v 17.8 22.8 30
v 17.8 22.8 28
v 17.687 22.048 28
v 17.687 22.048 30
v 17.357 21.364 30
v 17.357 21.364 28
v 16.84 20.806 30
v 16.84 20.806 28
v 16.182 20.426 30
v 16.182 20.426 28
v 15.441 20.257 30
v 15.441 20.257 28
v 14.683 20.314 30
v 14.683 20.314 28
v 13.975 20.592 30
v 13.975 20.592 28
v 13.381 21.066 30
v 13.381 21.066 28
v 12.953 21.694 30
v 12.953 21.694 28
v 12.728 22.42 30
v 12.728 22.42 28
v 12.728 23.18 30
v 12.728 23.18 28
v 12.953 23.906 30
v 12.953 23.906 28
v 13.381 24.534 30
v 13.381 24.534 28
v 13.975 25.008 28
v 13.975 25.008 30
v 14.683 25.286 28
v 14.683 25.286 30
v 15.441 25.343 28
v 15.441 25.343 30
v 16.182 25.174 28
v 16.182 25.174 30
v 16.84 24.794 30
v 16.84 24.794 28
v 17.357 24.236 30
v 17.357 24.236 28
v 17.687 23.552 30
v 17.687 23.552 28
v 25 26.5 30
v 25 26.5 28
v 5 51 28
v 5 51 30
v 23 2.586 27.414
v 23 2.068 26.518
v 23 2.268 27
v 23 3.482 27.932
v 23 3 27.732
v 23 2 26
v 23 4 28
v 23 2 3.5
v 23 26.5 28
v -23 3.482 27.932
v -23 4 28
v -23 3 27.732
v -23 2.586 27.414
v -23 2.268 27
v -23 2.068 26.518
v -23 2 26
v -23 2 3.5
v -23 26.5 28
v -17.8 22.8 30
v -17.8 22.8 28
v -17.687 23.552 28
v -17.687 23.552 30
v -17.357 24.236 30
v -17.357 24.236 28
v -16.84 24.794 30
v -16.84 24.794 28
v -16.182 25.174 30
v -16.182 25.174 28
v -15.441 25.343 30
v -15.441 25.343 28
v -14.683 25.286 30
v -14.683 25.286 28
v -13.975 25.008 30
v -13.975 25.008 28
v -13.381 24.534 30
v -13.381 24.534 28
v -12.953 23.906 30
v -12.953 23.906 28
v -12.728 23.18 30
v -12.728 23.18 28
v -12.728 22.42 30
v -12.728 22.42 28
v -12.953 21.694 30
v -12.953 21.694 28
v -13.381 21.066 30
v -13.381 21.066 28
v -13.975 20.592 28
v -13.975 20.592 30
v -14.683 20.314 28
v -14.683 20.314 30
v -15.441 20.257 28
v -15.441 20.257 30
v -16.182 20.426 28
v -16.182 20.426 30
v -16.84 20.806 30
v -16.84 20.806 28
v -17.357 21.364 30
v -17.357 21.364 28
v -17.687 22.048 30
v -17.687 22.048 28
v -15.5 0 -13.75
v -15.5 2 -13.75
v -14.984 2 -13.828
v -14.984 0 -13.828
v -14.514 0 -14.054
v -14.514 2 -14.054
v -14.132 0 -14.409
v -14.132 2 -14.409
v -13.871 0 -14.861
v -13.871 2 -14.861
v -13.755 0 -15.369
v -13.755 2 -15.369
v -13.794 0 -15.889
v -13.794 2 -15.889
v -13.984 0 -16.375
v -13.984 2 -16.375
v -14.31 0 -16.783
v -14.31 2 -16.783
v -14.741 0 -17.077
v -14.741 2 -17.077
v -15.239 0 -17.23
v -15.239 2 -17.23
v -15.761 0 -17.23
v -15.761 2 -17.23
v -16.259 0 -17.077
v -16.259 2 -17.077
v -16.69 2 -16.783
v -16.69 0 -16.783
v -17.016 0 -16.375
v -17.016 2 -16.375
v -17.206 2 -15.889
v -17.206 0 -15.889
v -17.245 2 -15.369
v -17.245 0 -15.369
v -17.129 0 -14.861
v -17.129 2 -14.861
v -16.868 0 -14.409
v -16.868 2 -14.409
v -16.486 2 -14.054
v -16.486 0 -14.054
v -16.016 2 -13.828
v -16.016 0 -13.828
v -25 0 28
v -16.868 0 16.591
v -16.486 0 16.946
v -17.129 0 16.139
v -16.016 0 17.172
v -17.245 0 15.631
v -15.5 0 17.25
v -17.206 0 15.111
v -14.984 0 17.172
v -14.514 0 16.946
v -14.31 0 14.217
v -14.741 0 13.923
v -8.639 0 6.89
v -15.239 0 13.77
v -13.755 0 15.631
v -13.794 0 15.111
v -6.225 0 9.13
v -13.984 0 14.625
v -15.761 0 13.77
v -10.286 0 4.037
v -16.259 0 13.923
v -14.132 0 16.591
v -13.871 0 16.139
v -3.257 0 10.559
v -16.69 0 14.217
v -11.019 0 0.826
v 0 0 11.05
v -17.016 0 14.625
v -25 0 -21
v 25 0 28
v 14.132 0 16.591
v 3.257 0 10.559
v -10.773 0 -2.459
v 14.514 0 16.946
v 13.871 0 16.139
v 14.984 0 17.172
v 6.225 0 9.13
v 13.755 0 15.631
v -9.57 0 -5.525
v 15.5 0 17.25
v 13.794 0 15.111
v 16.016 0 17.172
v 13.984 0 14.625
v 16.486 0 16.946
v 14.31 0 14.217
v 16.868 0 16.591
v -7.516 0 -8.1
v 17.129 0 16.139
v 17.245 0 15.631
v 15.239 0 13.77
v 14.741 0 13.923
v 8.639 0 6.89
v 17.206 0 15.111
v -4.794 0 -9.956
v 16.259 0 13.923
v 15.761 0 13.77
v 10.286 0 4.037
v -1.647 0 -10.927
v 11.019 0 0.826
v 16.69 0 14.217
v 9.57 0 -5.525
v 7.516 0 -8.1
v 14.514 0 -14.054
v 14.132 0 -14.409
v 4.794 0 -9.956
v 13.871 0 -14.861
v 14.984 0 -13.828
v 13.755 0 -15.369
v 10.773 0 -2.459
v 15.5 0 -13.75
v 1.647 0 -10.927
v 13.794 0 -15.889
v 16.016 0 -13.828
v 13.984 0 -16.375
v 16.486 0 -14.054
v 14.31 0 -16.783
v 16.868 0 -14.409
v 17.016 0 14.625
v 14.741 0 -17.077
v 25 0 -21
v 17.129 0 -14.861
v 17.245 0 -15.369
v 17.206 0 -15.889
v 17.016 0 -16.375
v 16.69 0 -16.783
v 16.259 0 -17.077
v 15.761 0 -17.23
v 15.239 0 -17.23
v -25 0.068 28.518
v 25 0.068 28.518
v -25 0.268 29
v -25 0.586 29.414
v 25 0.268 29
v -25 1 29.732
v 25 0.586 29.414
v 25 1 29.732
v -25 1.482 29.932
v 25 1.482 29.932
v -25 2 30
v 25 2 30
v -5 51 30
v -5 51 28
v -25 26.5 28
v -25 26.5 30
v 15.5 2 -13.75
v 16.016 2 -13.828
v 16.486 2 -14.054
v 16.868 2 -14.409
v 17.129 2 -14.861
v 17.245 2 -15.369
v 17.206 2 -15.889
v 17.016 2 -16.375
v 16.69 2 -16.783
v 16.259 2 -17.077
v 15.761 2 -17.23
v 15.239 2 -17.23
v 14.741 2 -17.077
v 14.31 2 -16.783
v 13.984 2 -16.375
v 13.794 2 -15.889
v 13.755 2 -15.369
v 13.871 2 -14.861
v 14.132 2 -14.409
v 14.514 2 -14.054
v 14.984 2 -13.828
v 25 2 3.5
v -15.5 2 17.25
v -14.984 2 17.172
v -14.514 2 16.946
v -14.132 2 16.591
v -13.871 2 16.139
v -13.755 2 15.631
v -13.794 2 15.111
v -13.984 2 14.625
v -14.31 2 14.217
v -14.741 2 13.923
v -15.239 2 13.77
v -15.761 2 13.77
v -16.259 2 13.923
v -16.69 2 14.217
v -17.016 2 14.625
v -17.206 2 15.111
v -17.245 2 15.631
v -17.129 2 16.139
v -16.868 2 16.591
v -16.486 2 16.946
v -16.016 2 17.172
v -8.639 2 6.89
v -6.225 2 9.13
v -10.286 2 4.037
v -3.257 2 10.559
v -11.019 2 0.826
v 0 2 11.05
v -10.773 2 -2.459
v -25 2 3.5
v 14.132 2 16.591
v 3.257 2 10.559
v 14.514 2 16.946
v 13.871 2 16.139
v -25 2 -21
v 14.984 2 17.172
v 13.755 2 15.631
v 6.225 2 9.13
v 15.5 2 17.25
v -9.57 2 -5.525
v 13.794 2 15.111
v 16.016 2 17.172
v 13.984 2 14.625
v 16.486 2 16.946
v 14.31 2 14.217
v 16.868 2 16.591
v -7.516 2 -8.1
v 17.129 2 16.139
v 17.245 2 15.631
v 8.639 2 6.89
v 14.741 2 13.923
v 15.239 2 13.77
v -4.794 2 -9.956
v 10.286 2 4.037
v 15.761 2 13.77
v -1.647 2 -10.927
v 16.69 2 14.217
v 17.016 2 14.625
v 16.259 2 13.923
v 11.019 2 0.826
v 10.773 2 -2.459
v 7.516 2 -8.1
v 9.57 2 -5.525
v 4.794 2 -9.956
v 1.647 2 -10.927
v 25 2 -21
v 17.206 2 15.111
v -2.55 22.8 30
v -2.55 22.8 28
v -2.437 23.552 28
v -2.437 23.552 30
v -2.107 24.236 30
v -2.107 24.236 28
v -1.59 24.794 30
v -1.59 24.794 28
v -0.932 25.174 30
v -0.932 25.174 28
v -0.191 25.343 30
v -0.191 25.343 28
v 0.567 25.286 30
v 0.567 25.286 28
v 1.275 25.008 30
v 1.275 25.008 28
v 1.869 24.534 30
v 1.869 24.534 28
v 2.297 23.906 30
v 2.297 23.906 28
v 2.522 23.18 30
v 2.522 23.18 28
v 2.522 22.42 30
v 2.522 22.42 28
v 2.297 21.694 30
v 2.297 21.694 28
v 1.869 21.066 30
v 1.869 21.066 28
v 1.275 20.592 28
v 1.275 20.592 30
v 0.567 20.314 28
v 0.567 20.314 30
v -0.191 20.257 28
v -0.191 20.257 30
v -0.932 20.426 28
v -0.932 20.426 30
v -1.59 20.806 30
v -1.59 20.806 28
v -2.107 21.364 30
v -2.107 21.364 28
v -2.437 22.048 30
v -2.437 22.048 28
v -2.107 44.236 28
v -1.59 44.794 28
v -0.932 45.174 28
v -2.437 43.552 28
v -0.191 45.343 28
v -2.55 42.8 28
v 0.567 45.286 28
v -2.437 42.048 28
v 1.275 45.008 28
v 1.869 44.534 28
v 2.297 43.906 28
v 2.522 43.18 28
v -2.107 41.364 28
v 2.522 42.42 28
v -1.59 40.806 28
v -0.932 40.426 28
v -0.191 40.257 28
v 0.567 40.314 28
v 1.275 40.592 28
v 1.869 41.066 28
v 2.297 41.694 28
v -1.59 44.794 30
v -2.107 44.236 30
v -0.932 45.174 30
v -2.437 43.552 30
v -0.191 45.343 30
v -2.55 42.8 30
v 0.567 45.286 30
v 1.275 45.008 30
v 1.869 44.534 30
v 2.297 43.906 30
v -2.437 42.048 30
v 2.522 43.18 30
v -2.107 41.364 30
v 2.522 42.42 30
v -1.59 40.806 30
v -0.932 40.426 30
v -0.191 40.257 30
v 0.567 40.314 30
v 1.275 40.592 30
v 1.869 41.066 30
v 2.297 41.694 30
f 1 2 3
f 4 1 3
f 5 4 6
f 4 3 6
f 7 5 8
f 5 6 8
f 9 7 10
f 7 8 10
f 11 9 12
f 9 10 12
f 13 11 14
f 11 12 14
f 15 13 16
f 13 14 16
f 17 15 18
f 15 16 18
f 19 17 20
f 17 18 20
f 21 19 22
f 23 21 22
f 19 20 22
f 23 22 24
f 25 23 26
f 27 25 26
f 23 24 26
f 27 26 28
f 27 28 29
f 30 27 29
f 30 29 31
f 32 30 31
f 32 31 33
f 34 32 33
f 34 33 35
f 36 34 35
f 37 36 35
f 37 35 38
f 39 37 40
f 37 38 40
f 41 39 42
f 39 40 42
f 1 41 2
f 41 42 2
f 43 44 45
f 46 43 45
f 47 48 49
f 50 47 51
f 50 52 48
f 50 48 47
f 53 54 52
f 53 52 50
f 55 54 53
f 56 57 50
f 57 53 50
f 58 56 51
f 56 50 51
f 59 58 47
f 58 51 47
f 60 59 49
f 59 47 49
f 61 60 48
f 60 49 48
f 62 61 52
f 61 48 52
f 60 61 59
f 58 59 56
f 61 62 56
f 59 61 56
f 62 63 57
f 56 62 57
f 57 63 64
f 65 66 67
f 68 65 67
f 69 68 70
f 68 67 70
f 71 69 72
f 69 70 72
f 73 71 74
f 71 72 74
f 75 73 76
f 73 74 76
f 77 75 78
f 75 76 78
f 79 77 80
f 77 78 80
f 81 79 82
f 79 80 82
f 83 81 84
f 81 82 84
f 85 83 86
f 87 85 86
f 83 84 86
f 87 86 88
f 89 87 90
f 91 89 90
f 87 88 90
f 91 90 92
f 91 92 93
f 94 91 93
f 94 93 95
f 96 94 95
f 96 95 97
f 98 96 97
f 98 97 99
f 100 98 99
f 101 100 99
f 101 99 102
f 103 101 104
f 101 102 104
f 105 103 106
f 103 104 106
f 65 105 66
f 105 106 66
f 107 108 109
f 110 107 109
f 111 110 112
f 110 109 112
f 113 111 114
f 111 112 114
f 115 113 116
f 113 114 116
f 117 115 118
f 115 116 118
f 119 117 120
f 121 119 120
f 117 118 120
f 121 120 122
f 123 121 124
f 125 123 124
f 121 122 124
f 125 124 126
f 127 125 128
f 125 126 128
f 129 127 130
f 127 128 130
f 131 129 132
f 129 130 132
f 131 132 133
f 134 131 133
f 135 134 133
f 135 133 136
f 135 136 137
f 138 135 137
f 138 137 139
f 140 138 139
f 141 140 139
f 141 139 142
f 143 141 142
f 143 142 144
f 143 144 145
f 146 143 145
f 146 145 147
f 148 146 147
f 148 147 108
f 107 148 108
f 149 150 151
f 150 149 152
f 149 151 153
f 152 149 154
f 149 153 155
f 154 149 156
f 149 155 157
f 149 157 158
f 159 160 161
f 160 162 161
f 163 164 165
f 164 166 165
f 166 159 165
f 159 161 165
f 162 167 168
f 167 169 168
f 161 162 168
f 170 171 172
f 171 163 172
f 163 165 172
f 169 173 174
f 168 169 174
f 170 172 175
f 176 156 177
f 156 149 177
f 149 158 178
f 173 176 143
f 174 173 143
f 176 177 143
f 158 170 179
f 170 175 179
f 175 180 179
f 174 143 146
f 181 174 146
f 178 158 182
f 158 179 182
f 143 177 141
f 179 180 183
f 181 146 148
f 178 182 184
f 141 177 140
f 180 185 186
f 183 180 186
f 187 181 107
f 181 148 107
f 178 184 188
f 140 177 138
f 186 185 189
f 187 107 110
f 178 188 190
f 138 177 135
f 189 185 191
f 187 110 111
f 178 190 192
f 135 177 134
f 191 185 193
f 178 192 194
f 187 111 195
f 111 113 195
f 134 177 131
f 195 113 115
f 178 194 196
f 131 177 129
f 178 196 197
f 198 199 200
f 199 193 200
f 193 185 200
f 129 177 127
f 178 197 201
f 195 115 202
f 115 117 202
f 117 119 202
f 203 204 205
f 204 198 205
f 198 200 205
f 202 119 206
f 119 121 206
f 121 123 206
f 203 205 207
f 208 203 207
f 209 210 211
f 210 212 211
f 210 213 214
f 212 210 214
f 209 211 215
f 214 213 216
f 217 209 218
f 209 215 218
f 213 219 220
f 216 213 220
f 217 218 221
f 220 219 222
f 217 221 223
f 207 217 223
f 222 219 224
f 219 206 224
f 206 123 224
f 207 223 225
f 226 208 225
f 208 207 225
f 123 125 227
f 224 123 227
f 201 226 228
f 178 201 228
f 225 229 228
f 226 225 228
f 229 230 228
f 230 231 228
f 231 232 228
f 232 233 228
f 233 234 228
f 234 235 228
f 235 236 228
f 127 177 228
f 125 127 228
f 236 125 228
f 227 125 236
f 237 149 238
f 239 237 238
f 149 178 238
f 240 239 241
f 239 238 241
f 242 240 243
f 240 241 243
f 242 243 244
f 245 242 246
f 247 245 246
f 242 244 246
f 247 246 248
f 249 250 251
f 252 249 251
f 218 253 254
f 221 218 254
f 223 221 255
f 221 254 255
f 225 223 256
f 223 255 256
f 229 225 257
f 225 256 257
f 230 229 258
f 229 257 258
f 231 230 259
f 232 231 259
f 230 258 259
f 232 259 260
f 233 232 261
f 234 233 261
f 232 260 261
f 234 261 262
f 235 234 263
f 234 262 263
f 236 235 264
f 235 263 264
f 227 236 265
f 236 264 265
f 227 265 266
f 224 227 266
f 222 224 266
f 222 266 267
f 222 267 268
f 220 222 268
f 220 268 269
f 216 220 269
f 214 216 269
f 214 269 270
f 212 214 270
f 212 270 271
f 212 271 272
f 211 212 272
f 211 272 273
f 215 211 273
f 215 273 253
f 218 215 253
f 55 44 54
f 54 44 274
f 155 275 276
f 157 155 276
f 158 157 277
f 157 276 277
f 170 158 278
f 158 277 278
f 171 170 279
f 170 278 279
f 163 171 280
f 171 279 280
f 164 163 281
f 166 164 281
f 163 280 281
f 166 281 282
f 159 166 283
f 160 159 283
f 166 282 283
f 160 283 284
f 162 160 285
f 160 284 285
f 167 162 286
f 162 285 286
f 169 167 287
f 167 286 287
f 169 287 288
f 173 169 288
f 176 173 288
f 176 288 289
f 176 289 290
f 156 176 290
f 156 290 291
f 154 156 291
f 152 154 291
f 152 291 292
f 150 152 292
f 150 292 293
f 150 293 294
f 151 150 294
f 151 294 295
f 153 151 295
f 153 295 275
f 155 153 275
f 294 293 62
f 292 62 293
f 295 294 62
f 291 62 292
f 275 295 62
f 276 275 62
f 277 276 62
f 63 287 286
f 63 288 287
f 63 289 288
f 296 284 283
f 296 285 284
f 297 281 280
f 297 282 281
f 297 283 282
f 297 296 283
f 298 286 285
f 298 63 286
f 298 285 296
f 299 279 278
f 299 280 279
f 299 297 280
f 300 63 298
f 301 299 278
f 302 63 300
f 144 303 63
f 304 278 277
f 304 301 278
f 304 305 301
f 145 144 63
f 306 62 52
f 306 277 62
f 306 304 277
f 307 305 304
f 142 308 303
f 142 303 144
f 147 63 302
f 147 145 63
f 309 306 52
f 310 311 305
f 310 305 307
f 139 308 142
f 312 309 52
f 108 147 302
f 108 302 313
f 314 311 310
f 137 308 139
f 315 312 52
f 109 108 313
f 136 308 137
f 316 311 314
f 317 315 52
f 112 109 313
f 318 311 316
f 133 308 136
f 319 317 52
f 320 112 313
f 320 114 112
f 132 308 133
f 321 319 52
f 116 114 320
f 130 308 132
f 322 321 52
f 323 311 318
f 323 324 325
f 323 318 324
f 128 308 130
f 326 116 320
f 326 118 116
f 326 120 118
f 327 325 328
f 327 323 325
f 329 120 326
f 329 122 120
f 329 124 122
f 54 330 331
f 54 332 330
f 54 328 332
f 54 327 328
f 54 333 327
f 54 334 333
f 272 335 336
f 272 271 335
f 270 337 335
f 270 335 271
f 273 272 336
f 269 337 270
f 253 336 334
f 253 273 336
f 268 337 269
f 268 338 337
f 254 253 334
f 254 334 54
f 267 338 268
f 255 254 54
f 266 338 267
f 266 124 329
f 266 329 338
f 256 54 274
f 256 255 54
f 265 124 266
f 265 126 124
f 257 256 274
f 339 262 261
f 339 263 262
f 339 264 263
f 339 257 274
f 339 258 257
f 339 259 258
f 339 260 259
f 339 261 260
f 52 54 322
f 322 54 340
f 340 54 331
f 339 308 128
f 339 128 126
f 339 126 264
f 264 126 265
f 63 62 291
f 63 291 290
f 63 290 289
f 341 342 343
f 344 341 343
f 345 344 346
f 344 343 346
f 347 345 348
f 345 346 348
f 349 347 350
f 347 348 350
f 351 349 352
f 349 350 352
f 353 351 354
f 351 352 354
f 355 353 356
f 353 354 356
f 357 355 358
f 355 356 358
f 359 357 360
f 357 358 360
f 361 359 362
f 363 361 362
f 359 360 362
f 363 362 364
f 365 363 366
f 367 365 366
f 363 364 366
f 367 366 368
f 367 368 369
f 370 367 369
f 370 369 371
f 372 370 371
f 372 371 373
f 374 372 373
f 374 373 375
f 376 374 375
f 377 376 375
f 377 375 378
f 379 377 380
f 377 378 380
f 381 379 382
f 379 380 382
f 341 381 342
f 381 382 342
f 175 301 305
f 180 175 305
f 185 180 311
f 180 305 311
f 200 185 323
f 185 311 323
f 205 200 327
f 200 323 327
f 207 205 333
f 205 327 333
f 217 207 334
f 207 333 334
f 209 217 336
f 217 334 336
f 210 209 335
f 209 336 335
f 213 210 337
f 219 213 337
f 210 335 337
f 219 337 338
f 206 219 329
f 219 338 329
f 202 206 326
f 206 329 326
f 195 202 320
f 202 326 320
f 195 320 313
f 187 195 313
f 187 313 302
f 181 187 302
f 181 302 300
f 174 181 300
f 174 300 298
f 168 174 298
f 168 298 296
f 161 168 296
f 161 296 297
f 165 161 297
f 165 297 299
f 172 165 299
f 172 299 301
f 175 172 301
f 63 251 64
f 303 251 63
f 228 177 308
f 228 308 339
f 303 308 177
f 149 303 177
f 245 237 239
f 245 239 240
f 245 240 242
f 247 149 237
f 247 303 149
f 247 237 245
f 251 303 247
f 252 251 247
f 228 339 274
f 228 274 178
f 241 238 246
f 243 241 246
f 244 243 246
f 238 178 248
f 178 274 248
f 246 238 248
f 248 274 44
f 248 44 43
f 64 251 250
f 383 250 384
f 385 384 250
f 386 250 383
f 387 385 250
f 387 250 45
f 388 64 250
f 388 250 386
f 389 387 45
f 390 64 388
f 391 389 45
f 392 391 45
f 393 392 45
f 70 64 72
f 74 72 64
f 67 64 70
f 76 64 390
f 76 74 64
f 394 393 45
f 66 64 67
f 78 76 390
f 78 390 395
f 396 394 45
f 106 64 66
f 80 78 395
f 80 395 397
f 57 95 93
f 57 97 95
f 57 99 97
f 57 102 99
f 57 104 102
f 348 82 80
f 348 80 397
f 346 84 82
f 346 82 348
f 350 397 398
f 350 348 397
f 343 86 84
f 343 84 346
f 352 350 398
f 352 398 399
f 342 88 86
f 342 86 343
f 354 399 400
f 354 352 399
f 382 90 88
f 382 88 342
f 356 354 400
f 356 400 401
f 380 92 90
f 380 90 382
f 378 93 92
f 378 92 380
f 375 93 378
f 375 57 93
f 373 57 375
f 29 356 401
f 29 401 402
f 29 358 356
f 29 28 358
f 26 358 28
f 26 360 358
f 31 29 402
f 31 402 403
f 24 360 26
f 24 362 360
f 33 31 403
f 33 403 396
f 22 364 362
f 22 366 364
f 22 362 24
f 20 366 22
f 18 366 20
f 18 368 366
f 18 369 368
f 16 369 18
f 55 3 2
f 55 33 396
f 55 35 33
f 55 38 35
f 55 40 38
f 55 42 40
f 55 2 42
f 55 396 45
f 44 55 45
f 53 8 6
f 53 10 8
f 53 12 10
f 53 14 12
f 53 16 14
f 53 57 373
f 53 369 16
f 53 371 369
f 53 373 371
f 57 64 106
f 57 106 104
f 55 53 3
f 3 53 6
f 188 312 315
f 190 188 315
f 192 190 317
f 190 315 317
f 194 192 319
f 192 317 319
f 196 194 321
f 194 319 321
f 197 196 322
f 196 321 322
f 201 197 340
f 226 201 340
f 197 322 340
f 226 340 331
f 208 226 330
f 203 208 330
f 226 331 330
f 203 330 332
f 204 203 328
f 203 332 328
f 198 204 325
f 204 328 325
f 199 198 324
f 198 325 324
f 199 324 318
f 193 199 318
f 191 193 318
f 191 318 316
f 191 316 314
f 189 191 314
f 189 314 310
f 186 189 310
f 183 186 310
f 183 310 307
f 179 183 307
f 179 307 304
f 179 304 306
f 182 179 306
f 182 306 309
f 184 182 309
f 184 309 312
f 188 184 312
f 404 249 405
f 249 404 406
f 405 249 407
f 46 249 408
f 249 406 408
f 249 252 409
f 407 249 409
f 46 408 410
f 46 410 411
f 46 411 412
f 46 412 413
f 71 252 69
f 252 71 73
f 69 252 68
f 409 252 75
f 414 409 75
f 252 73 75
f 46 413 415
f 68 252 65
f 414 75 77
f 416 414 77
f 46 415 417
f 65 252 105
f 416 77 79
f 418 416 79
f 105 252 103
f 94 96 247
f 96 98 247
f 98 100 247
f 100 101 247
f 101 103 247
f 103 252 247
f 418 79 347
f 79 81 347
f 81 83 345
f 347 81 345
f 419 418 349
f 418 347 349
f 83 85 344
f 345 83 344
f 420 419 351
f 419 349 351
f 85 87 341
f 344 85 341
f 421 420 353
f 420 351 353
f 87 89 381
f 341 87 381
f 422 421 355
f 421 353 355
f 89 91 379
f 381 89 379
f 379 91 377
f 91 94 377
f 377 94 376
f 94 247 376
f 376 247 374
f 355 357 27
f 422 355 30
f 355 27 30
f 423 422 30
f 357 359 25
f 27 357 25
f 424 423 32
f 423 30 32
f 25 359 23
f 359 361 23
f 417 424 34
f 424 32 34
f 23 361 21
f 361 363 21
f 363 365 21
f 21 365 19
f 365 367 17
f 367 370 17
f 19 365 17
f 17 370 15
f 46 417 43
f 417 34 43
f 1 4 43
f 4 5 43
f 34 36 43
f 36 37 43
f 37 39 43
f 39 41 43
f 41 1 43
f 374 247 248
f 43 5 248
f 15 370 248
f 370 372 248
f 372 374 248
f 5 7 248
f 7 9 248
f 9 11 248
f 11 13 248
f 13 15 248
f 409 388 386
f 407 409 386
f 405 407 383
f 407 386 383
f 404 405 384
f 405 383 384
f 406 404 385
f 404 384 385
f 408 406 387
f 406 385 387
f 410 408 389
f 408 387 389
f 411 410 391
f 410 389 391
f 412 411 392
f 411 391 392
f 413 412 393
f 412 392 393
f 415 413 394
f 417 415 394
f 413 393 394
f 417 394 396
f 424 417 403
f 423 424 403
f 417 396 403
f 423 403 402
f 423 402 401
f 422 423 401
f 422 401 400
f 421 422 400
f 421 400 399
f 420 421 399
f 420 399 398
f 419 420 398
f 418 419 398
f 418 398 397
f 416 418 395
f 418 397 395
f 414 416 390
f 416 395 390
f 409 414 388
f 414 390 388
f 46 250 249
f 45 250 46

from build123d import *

# Parameters (mm, degrees)
SKETCH1_W           = 50
SKETCH1_H           = 51
BOSS_EXTRUDE1_DEPTH = 2
SKETCH2_R           = 11.05
SKETCH2_R_2         = 1.75
CUT_EXTRUDE1_DEPTH  = 3
SKETCH4_W           = 50
SKETCH4_H           = 2
BOSS_EXTRUDE2_DEPTH = 49
BOSS_EXTRUDE3_DEPTH = 2
BOSS_EXTRUDE4_DEPTH = 2
SKETCH7_R           = 2.55
CUT_EXTRUDE2_DEPTH  = 2
FILLET1_R           = 2
SKETCH8_R           = 2.55
CUT_EXTRUDE4_DEPTH  = 2


with BuildPart() as part:
    # Sketch1 → Boss-Extrude1 (new body)
    with BuildSketch(Plane(origin=(0, 0, 0), x_dir=(1, 0, 0), z_dir=(0, 1, 0))):
        with Locations((0, -4.5)):
            Rectangle(SKETCH1_W, SKETCH1_H)
    extrude(amount=BOSS_EXTRUDE1_DEPTH)

    # Sketch2 → Cut-Extrude1 (cut)
    with BuildSketch(Plane(origin=(0, 2, 0), x_dir=(1, 0, 0), z_dir=(0, 1, 0))):
        with Locations(Location((0, 0, 0), (0, 0, 270))):
            Circle(SKETCH2_R)
        with Locations(Location((-15.5, 15.5, 0), (0, 0, 270))):
            Circle(SKETCH2_R_2)
        with Locations(Location((-15.5, -15.5, 0), (0, 0, 270))):
            Circle(SKETCH2_R_2)
        with Locations(Location((15.5, -15.5, 0), (0, 0, 270))):
            Circle(SKETCH2_R_2)
        with Locations(Location((15.5, 15.5, 0), (0, 0, 270))):
            Circle(SKETCH2_R_2)
    extrude(amount=-CUT_EXTRUDE1_DEPTH, mode=Mode.SUBTRACT)

    # Sketch4 → Boss-Extrude2 (add)
    with BuildSketch(Plane(origin=(0, 2, 0), x_dir=(1, 0, 0), z_dir=(0, 1, 0))):
        with Locations((0, -29)):
            Rectangle(SKETCH4_W, SKETCH4_H)
    extrude(amount=BOSS_EXTRUDE2_DEPTH)

    # Sketch5 → Boss-Extrude3 (add)
    with BuildSketch(Plane(origin=(25, 0, 0), x_dir=(0, 0, -1), z_dir=(1, 0, 0))):
        Polygon((-28, 26.5), (-3.5, 2), (-28, 2), align=None)
    extrude(amount=-BOSS_EXTRUDE3_DEPTH)

    # Sketch6 → Boss-Extrude4 (add)
    with BuildSketch(Plane.ZY.offset(25)):
        Polygon((28, 26.5), (3.5, 2), (28, 2), align=None)
    extrude(amount=-BOSS_EXTRUDE4_DEPTH)

    # Sketch7 → Cut-Extrude2 (cut)
    with BuildSketch(Plane(origin=(0, 0, 28), x_dir=(-1, 0, 0), z_dir=(0, 0, -1))):
        with Locations((0, 22.8)):
            Circle(SKETCH7_R)
        with Locations((0, 42.8)):
            Circle(SKETCH7_R)
        with Locations((15.25, 22.8)):
            Circle(SKETCH7_R)
        with Locations((15.25, 42.8)):
            Circle(SKETCH7_R)
        with Locations(Location((-15.25, 42.8, 0), (0, 0, 180))):
            Circle(SKETCH7_R)
        with Locations(Location((-15.25, 22.8, 0), (0, 0, 180))):
            Circle(SKETCH7_R)
    extrude(amount=-CUT_EXTRUDE2_DEPTH, mode=Mode.SUBTRACT)

    # Fillet1
    fillet1_edges = [part.edges().sort_by_distance(p)[0] for p in [
        (0, 0, 30),
        (0, 2, 28),
    ]]
    fillet(fillet1_edges, radius=FILLET1_R)

    # Sketch8 → Cut-Extrude4 (cut)
    # profile 1 of 2: a face of its own
    with BuildSketch(Plane(origin=(0, 0, 28), x_dir=(-1, 0, 0), z_dir=(0, 0, -1))):
        Polygon((25, 51), (5, 51), (25, 26.5), align=None)
        with Locations((15.25, 42.8)):
            Circle(SKETCH8_R, mode=Mode.SUBTRACT)
    # profile 2 of 2: a face of its own
    with BuildSketch(Plane(origin=(0, 0, 28), x_dir=(-1, 0, 0), z_dir=(0, 0, -1))):
        Polygon((-25, 26.5), (-5, 51), (-25, 51), align=None)
        with Locations((-15.25, 42.8)):
            Circle(SKETCH8_R, mode=Mode.SUBTRACT)
    extrude(amount=-CUT_EXTRUDE4_DEPTH, mode=Mode.SUBTRACT)


solid = part.part
